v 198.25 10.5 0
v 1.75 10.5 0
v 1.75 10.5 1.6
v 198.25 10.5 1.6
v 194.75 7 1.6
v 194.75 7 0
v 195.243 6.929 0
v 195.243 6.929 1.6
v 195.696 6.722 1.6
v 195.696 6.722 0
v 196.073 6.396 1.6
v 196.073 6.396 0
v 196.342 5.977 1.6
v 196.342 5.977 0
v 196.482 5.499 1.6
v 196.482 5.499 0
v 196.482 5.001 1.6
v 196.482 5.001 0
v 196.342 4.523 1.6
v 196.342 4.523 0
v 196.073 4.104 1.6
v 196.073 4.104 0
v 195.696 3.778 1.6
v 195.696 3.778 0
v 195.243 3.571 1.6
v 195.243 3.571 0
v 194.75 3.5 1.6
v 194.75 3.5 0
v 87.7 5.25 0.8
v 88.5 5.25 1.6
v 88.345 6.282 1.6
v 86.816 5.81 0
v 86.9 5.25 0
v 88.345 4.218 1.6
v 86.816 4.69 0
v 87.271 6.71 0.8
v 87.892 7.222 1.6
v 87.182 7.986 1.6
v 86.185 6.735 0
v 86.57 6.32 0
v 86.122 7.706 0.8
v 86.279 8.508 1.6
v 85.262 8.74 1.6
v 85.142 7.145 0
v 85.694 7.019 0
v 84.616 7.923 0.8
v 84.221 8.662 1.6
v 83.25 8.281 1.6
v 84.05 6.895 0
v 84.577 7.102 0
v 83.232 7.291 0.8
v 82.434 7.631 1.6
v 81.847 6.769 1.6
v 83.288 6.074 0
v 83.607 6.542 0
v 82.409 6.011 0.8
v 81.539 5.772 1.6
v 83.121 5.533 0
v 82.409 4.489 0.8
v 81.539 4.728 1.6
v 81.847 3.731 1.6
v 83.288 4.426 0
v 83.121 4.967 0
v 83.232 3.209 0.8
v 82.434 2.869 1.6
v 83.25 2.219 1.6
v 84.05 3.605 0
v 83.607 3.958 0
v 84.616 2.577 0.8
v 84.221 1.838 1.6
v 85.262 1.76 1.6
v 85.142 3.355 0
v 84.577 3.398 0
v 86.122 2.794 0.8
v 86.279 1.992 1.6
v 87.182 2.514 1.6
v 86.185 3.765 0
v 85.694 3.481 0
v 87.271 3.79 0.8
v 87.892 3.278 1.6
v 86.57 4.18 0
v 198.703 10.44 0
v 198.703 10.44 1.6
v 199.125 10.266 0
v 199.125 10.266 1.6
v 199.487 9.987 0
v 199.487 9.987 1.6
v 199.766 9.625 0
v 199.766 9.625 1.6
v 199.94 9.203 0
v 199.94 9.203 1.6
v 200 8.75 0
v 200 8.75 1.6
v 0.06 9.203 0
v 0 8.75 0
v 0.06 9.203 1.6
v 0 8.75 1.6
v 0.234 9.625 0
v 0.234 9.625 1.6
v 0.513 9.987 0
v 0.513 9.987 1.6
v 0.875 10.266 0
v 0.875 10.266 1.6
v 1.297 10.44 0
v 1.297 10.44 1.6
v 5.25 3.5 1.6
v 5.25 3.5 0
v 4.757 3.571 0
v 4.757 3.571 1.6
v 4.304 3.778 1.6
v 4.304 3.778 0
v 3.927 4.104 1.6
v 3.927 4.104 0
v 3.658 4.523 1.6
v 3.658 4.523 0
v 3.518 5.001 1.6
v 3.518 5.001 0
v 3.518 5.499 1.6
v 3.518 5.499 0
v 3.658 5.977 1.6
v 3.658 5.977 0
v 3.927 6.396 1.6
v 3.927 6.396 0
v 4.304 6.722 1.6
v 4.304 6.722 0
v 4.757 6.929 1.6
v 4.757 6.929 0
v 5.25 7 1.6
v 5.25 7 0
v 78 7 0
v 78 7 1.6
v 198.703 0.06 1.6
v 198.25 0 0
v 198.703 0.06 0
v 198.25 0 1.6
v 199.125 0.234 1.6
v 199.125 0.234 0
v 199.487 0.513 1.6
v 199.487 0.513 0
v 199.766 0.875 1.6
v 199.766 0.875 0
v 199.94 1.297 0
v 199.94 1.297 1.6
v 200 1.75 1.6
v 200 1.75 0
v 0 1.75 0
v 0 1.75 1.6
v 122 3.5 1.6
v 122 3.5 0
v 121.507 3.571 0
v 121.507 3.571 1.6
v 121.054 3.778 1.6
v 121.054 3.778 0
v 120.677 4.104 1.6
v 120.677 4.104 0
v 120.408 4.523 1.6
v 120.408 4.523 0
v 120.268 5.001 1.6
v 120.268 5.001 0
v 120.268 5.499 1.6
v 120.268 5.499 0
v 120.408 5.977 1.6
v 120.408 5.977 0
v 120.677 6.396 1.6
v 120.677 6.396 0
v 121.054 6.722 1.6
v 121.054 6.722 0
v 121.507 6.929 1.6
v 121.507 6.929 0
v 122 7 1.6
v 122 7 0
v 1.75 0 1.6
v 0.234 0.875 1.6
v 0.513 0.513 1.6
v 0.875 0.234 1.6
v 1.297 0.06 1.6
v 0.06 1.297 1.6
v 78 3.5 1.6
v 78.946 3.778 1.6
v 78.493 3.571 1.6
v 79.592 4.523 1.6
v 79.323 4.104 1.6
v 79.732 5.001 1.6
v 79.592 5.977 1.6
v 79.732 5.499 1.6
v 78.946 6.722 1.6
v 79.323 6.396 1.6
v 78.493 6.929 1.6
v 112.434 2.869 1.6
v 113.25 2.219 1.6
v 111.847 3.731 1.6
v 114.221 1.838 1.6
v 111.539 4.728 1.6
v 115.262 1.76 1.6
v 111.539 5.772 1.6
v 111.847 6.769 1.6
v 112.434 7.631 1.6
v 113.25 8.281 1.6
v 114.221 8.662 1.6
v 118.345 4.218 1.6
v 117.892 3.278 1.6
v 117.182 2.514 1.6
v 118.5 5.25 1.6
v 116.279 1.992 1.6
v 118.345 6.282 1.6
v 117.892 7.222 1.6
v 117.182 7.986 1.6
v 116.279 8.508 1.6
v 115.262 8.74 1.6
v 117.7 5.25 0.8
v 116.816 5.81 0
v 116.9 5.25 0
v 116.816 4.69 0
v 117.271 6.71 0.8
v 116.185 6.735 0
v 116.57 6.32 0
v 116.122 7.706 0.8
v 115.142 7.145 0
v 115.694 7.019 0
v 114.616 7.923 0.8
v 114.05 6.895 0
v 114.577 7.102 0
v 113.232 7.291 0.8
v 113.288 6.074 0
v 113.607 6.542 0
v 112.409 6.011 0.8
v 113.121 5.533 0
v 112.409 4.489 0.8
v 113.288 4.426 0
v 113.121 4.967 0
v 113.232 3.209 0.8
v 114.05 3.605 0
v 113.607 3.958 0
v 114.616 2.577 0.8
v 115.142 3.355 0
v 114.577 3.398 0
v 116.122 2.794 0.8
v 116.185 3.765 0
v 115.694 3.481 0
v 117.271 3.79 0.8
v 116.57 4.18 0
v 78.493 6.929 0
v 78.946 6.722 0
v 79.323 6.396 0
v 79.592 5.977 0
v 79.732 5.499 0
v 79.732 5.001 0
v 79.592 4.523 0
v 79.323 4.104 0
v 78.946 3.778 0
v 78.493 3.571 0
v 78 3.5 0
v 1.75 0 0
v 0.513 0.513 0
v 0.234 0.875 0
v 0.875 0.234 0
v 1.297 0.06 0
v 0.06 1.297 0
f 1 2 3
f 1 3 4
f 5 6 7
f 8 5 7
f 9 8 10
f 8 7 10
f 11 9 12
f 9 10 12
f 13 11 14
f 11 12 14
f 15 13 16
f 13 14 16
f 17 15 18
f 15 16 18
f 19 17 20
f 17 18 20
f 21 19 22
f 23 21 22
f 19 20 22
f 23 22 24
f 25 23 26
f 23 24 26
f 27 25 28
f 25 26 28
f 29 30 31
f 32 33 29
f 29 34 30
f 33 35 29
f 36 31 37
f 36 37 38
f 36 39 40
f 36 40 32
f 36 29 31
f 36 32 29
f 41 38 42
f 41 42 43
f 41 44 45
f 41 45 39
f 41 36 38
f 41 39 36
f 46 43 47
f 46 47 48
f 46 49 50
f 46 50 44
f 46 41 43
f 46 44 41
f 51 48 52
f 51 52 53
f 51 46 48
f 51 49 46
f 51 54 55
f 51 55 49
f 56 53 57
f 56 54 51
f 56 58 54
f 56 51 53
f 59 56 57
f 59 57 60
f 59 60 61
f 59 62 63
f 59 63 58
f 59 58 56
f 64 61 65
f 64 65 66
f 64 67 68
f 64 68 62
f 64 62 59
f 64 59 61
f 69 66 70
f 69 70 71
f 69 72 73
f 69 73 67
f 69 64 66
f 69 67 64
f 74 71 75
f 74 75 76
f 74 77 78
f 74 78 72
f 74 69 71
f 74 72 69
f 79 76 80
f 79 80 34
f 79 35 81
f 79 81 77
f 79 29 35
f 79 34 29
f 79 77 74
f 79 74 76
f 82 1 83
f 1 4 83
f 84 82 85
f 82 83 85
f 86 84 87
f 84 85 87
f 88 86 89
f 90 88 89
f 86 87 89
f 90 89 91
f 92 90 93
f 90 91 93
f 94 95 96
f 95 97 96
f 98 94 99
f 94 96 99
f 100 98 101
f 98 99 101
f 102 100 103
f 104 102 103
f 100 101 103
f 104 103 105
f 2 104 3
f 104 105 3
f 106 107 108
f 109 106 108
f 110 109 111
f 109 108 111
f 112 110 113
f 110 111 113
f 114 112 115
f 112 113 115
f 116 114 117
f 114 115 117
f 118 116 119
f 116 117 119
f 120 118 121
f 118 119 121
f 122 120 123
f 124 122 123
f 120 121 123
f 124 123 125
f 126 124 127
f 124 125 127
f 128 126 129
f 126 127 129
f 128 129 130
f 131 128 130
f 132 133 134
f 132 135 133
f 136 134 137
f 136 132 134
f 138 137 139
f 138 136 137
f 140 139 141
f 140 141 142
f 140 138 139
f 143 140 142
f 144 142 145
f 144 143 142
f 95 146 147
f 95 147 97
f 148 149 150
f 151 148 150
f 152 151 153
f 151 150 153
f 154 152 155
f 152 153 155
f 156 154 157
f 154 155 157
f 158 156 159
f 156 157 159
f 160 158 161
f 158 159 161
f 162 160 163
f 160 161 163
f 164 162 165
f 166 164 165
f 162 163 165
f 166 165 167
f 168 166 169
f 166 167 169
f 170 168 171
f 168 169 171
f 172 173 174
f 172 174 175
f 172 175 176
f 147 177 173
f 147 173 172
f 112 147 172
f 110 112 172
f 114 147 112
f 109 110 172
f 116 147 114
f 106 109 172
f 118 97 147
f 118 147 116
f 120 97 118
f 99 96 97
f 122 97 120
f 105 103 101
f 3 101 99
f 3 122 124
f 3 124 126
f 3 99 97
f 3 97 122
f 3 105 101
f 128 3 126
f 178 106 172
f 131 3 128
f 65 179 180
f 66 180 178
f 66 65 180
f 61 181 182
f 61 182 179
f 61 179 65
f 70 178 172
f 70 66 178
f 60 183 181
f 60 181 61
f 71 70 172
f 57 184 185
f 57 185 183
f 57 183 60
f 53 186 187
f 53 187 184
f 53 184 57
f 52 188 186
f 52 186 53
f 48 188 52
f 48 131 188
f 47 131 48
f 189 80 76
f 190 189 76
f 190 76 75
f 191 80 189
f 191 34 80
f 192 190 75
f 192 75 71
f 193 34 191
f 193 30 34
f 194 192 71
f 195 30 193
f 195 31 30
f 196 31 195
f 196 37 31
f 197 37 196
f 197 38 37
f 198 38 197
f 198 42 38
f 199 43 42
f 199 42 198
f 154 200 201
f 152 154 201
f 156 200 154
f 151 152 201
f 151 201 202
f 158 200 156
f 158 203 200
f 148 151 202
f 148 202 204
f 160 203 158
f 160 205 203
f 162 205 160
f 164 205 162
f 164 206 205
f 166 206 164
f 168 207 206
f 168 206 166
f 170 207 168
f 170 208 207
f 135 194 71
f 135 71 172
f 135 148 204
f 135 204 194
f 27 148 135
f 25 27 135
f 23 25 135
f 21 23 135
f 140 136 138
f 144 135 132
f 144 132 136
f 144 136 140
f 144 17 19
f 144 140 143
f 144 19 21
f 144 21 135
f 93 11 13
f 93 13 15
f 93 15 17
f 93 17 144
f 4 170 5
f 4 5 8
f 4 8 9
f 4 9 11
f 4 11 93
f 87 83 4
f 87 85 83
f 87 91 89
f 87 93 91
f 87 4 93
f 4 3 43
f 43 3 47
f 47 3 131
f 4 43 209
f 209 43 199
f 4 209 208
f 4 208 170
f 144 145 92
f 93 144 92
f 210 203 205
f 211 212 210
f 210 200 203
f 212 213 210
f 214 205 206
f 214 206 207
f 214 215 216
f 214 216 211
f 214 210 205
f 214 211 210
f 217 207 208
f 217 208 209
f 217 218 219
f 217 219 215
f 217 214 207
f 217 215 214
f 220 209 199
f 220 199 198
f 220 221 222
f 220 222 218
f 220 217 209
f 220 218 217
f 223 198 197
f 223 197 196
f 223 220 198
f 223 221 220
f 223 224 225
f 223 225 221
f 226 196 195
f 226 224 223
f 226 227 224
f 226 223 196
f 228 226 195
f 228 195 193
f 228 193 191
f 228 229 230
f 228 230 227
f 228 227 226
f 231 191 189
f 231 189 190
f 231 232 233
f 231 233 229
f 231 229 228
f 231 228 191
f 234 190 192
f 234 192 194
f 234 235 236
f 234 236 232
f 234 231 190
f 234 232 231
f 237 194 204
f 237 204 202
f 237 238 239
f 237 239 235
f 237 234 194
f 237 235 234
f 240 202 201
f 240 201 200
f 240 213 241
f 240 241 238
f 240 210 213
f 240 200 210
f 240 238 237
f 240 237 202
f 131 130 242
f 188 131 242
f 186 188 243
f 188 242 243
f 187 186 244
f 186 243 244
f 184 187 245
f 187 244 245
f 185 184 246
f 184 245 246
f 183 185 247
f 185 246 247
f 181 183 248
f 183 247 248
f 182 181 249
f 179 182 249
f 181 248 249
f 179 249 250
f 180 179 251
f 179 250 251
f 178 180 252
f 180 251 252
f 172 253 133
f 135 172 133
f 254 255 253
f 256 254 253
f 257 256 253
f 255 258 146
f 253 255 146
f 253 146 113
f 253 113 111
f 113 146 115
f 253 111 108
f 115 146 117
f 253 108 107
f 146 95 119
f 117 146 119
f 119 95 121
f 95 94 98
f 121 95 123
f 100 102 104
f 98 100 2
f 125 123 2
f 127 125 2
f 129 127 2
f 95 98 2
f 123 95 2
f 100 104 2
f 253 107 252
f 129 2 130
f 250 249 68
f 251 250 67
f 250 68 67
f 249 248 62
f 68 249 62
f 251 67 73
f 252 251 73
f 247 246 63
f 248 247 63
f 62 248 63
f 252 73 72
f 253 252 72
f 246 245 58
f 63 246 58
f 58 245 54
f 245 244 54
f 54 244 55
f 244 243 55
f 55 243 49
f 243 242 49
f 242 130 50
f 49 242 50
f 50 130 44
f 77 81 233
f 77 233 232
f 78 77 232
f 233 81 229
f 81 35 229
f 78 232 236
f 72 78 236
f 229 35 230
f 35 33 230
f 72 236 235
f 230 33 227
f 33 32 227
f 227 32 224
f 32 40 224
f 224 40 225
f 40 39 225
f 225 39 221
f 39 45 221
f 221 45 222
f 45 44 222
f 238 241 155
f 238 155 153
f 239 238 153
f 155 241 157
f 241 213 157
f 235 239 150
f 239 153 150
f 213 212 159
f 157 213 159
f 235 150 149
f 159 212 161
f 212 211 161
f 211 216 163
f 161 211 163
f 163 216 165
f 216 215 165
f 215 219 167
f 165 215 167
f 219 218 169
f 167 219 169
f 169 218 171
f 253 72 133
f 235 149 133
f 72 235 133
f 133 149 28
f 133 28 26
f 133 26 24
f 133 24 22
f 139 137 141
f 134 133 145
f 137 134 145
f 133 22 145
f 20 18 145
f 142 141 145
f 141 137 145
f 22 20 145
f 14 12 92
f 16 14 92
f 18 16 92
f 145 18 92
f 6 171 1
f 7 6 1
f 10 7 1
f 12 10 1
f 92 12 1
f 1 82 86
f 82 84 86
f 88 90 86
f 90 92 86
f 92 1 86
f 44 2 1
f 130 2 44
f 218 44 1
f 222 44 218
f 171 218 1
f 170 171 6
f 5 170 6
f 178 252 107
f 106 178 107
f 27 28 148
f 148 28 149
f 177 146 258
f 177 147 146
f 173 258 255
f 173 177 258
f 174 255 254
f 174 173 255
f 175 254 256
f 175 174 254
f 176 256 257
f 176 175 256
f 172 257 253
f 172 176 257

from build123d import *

# Parameters (mm, degrees)
F1_W     = 200
F1_H     = 10.5
F1_R     = 1.75
F2_DEPTH = 1.6
F3_R     = 1.75


# Not quite as in the source:
# - a fillet or chamfer that OpenCascade refuses, or shapes differently, is made with other operations: its cross-section is extruded or revolved along the edge and cut away or added
# - a feature names something its author has since deleted; it is built from what else it names


with BuildPart() as f2:
    # F1 (on Top) → F2 (new body)
    with BuildSketch(Plane.XY):
        with Locations((100, 5.25)):
            Rectangle(F1_W, F1_H)
        with BuildLine():
            ThreePointArc((78, 7), (79.75, 5.25), (78, 3.5))
            Line((78, 3.5), (5.25, 3.5))
            ThreePointArc((5.25, 3.5), (3.5, 5.25), (5.25, 7))
            Line((5.25, 7), (78, 7))
        make_face(mode=Mode.SUBTRACT)
        with Locations((85, 5.25)):
            Circle(F1_R, mode=Mode.SUBTRACT)
        with Locations((115, 5.25)):
            Circle(F1_R, mode=Mode.SUBTRACT)
        with BuildLine():
            Line((122, 7), (194.75, 7))
            ThreePointArc((194.75, 7), (196.5, 5.25), (194.75, 3.5))
            Line((194.75, 3.5), (122, 3.5))
            ThreePointArc((122, 3.5), (120.25, 5.25), (122, 7))
        make_face(mode=Mode.SUBTRACT)
    extrude(amount=F2_DEPTH)

    # F3
    f3_edges = [f2.edges().sort_by_distance(p)[0] for p in [
        (0, 10.5, 0.8),
        (0, 0, 0.8),
        (200, 0, 0.8),
        (200, 10.5, 0.8),
    ]]
    fillet(f3_edges, radius=F3_R)

    # F4: chamfer of 1.75 on 2 edges, made by hand

    # F4_s1 → F4_t2 (revolve, cut)
    with BuildSketch(Plane.XZ.offset(-5.25)):
        Polygon((88.5, 1.6), (86.75, -0.15), (86.75, 1.6), align=None)
    revolve(axis=Axis((85, 5.25, 1.6), (0, 0, 1)), mode=Mode.SUBTRACT)

    # F4_s3 → F4_t4 (revolve, cut)
    with BuildSketch(Plane.XZ.offset(-5.25)):
        Polygon((118.5, 1.6), (116.75, -0.15), (116.75, 1.6), align=None)
    revolve(axis=Axis((115, 5.25, 1.6), (0, 0, 1)), mode=Mode.SUBTRACT)


solid = f2.part
